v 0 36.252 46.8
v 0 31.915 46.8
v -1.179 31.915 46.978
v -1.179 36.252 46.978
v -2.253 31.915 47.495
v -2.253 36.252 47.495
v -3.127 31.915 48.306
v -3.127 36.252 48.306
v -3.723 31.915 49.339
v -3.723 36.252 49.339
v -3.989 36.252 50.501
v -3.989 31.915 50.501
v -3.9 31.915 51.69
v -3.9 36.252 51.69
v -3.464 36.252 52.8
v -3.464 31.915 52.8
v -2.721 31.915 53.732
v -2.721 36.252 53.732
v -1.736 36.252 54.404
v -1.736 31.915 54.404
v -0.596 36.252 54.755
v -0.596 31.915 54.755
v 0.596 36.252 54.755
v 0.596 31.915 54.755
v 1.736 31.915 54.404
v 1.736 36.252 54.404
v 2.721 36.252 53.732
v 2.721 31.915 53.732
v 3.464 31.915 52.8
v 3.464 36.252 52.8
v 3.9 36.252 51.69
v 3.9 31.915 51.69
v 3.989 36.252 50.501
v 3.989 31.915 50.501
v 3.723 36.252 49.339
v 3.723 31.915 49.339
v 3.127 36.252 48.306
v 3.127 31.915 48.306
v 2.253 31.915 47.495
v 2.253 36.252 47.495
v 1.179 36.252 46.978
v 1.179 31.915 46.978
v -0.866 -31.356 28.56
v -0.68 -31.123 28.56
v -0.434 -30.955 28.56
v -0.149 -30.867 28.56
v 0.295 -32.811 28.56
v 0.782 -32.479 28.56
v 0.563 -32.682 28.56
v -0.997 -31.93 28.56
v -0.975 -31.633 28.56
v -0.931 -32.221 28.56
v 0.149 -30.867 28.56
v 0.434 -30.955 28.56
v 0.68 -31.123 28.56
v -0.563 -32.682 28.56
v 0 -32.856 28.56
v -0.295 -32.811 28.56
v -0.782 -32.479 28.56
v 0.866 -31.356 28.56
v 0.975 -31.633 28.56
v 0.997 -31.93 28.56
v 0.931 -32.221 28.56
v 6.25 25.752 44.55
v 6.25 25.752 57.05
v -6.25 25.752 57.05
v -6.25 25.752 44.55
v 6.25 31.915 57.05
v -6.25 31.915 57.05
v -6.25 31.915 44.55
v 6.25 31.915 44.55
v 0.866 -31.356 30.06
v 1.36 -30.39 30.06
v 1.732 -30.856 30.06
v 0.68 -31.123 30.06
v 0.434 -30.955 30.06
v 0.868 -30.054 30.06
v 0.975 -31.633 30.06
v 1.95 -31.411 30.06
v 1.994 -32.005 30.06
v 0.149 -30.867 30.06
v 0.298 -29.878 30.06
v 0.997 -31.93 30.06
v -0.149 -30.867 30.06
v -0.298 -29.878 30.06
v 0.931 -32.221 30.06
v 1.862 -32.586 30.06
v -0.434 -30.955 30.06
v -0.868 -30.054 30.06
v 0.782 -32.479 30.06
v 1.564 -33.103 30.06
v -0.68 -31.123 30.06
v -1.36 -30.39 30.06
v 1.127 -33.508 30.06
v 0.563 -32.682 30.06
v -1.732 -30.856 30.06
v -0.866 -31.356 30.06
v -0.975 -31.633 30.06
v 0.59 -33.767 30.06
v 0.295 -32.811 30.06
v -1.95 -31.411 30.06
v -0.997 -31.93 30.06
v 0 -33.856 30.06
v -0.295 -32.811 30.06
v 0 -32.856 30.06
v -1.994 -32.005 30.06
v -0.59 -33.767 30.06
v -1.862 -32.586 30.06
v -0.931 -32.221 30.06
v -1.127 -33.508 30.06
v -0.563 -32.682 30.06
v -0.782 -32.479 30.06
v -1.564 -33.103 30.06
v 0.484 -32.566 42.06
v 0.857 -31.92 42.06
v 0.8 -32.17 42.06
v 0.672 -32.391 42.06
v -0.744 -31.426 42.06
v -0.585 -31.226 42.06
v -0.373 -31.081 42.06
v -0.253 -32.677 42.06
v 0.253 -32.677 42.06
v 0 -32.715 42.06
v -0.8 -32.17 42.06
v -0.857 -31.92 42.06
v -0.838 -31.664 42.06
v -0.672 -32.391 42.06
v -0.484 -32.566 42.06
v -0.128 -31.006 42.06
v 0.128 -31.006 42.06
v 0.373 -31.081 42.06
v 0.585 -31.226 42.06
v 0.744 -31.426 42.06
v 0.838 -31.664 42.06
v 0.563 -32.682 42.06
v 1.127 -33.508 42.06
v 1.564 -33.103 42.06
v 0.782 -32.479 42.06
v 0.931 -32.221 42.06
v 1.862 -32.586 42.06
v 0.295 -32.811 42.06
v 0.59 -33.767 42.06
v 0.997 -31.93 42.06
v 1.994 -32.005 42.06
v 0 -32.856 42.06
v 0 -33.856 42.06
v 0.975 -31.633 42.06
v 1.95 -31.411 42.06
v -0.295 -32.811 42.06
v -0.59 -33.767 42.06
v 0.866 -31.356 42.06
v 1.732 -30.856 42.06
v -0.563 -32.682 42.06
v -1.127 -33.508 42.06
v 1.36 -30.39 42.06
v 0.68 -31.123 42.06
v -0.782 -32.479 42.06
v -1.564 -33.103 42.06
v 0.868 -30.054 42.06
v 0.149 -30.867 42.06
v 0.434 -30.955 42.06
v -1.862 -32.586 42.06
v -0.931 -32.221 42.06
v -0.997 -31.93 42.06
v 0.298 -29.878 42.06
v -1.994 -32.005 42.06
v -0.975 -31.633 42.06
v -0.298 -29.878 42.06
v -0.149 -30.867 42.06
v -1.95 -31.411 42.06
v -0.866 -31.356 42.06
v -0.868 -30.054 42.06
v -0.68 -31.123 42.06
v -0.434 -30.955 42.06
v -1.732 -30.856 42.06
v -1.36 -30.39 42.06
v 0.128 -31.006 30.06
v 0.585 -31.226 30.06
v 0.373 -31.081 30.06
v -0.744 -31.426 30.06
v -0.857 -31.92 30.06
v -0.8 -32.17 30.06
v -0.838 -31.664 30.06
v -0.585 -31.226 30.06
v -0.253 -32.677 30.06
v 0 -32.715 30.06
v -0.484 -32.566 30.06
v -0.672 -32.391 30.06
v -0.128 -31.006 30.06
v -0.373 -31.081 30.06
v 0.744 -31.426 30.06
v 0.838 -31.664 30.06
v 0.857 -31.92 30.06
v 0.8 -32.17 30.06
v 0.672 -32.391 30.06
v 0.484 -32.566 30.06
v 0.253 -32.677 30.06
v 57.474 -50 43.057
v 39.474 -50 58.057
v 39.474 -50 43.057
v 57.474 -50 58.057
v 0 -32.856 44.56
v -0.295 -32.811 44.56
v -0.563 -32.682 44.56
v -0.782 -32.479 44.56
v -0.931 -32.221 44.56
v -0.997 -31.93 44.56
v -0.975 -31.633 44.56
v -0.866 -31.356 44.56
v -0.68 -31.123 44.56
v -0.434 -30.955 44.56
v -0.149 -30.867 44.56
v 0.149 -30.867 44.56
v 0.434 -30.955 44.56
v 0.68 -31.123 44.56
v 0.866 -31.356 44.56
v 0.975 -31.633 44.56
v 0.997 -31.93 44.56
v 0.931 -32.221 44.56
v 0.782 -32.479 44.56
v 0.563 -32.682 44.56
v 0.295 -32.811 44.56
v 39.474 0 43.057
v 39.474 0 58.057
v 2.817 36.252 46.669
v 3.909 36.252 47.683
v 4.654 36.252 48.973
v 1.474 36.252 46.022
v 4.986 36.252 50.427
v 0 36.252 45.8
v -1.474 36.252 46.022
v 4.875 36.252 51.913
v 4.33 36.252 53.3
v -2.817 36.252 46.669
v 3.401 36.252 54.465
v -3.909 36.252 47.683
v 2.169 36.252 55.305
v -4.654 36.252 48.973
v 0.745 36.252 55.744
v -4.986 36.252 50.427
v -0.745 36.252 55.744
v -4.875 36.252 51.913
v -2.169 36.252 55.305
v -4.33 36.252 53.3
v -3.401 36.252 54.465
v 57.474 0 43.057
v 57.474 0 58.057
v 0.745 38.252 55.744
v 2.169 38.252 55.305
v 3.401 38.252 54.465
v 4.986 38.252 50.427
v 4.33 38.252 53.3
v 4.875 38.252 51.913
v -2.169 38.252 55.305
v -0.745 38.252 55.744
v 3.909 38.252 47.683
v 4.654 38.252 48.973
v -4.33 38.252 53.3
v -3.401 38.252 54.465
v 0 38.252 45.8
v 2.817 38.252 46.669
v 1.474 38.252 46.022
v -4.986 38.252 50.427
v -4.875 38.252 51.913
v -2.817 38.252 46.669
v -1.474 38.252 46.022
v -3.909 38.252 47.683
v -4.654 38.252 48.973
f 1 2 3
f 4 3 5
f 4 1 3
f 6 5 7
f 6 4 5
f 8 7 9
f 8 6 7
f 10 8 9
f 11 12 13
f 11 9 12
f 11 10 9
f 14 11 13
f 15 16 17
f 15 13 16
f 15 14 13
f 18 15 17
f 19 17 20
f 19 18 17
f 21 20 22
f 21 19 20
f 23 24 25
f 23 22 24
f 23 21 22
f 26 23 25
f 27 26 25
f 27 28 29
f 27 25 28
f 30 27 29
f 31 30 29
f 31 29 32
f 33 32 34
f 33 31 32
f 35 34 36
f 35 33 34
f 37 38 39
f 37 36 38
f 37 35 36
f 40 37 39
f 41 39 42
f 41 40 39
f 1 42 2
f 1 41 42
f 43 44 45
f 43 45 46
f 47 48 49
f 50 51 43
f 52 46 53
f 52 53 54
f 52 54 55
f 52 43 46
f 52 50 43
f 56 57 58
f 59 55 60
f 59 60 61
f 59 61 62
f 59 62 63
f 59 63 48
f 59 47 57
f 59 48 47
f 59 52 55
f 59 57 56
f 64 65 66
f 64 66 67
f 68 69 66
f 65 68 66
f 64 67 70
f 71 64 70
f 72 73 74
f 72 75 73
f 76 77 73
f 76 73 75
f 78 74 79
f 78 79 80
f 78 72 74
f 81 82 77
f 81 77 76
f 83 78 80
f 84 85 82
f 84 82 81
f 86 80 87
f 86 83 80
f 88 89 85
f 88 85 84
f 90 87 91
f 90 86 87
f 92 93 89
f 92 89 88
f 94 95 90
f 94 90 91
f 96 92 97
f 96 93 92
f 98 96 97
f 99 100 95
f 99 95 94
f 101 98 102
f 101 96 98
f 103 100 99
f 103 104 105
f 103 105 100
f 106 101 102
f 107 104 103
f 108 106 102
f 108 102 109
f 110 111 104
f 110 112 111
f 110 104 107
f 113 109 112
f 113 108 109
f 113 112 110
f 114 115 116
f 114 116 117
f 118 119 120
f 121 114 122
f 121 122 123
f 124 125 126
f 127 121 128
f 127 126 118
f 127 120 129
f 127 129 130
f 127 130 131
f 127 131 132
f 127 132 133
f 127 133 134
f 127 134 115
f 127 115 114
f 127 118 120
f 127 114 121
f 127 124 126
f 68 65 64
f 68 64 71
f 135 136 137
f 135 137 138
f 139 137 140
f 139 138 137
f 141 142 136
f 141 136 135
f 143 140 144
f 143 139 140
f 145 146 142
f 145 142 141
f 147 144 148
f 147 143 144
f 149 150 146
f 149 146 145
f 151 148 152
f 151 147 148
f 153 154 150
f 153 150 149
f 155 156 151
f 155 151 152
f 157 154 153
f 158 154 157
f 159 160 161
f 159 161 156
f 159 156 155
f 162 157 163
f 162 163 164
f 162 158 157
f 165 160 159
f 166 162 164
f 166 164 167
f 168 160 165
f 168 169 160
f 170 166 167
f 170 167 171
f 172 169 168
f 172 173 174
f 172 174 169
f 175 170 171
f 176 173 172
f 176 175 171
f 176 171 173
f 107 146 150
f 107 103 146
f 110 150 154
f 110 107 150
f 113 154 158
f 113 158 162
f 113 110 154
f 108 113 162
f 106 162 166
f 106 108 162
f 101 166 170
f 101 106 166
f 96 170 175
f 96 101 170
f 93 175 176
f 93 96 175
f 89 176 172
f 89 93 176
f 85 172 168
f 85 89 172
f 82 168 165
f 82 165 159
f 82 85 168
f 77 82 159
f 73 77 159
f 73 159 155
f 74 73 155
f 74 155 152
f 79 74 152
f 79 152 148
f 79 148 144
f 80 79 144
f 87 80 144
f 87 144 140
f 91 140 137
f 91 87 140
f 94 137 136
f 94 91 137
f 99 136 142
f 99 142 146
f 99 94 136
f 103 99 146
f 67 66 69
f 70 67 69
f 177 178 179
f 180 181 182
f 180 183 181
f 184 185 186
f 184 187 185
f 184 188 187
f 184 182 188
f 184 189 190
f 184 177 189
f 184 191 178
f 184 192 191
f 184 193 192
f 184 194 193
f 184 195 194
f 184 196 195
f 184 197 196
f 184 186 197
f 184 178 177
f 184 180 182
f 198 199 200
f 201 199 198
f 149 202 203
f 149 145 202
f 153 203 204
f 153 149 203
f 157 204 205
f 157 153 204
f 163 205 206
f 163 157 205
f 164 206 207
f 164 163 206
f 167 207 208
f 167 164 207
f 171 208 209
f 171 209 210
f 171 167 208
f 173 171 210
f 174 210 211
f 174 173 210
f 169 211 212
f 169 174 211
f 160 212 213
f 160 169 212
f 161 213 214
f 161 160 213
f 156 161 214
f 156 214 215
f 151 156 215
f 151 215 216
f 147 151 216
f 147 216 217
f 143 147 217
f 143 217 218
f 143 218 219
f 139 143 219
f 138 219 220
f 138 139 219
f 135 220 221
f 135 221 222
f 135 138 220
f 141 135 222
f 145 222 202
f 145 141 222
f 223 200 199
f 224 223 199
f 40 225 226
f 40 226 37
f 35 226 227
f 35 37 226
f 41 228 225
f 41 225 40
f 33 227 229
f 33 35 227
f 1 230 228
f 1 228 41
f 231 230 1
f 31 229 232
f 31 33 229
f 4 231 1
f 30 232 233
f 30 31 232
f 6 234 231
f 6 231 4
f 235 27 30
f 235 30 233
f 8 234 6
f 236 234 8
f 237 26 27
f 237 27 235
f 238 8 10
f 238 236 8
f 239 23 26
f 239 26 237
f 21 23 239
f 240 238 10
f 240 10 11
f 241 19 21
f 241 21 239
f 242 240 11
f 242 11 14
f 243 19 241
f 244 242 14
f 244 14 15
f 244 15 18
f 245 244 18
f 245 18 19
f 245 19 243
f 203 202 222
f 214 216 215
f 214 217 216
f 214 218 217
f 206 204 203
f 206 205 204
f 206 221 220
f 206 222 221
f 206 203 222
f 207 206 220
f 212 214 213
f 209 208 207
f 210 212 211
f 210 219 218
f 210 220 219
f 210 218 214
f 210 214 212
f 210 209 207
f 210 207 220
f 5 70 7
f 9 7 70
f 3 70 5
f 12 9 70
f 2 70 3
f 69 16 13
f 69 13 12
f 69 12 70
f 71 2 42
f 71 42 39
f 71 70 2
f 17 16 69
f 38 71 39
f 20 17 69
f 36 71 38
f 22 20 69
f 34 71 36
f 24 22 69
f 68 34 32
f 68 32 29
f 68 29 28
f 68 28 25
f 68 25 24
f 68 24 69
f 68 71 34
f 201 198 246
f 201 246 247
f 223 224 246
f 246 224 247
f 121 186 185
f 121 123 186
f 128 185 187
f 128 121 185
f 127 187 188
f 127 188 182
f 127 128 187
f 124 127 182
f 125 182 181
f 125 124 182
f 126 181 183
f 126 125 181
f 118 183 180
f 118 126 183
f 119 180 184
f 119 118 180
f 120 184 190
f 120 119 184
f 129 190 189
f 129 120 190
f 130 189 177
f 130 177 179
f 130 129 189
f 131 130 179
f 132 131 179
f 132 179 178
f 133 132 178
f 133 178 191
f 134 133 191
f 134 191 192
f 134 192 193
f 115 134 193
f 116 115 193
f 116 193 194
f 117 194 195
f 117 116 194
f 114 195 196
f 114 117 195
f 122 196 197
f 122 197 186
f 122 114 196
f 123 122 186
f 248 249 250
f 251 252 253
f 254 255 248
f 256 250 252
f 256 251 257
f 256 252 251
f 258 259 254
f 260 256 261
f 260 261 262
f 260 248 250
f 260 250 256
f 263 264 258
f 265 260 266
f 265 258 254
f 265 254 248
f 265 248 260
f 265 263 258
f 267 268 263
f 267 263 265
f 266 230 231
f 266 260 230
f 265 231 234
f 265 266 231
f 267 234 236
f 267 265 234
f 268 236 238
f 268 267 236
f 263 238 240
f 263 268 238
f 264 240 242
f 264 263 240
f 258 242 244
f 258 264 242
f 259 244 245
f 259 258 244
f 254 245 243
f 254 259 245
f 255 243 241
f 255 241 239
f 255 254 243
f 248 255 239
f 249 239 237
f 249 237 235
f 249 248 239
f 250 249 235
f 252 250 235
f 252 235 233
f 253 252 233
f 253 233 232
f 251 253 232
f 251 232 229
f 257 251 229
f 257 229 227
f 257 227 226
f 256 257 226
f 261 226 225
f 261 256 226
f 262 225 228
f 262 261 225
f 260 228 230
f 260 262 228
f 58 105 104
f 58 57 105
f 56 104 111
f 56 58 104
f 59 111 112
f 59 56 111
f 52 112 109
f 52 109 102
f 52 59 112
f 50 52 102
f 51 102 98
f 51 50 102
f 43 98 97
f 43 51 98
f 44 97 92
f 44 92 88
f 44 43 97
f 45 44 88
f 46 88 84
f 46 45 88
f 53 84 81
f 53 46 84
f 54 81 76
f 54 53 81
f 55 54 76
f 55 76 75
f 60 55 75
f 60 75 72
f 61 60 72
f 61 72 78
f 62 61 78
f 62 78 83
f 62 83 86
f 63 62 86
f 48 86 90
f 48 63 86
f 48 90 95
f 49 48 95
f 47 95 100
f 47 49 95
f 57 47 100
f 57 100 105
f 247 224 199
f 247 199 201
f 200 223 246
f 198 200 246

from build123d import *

# Parameters (mm, degrees)
F2_W          = 18
F2_H          = 15
F3_DEPTH      = 50
F4_W          = 4.336892
F4_H          = 4
F6_DEPTH      = 6.25
F6_DEPTH_BACK = 6.25


with BuildPart() as f1:
    # F0 (on Right) → F1 (revolve)
    with BuildSketch(Plane.YZ):
        Polygon((-32.855664, 30.060289), (-32.715008, 30.060289), (-32.715008, 32.329431), (-32.715008, 42.060289), (-32.855664, 42.060289), (-33.855664, 42.060289), (-33.855664, 30.060289), align=None)
        Polygon((-31.855664, 28.560289), (-31.855664, 30.060289), (-32.715008, 30.060289), (-32.855664, 30.060289), (-32.855664, 28.560289), align=None)
        Polygon((-32.715008, 42.060289), (-31.855664, 42.060289), (-31.855664, 44.560289), (-32.855664, 44.560289), (-32.855664, 42.060289), align=None)
    revolve(axis=Axis((0, -31.855664, 36.060289), (0, 0, -1)))


with BuildPart() as f3:
    # F2 (on Front) → F3 (new body)
    with BuildSketch(Plane.XZ):
        with Locations((48.474338, 50.557407)):
            Rectangle(F2_W, F2_H)
    extrude(amount=F3_DEPTH)


with BuildPart() as f5:
    # F4 (on Right) → F5 (revolve)
    with BuildSketch(Plane.YZ):
        Polygon((38.251927, 50.800157), (36.251927, 50.800157), (36.251927, 46.800157), (36.251927, 45.800157), (38.251927, 45.800157), align=None)
        with Locations((34.083481, 48.800157)):
            Rectangle(F4_W, F4_H)
    revolve(axis=Axis((0, 37.28378, 50.800157), (0, 1, 0)))

    # F4 (on Right) → F6 (join, two sides)
    with BuildSketch(Plane.YZ) as f6_sk:
        Polygon((31.915035, 57.050157), (25.751927, 57.050157), (25.751927, 44.550157), (31.915035, 44.550157), (31.915035, 46.800157), (31.915035, 50.800157), align=None)
    extrude(amount=F6_DEPTH)
    extrude(f6_sk.sketch, amount=-F6_DEPTH_BACK)


solid = Compound([f1.part, f3.part, f5.part])
